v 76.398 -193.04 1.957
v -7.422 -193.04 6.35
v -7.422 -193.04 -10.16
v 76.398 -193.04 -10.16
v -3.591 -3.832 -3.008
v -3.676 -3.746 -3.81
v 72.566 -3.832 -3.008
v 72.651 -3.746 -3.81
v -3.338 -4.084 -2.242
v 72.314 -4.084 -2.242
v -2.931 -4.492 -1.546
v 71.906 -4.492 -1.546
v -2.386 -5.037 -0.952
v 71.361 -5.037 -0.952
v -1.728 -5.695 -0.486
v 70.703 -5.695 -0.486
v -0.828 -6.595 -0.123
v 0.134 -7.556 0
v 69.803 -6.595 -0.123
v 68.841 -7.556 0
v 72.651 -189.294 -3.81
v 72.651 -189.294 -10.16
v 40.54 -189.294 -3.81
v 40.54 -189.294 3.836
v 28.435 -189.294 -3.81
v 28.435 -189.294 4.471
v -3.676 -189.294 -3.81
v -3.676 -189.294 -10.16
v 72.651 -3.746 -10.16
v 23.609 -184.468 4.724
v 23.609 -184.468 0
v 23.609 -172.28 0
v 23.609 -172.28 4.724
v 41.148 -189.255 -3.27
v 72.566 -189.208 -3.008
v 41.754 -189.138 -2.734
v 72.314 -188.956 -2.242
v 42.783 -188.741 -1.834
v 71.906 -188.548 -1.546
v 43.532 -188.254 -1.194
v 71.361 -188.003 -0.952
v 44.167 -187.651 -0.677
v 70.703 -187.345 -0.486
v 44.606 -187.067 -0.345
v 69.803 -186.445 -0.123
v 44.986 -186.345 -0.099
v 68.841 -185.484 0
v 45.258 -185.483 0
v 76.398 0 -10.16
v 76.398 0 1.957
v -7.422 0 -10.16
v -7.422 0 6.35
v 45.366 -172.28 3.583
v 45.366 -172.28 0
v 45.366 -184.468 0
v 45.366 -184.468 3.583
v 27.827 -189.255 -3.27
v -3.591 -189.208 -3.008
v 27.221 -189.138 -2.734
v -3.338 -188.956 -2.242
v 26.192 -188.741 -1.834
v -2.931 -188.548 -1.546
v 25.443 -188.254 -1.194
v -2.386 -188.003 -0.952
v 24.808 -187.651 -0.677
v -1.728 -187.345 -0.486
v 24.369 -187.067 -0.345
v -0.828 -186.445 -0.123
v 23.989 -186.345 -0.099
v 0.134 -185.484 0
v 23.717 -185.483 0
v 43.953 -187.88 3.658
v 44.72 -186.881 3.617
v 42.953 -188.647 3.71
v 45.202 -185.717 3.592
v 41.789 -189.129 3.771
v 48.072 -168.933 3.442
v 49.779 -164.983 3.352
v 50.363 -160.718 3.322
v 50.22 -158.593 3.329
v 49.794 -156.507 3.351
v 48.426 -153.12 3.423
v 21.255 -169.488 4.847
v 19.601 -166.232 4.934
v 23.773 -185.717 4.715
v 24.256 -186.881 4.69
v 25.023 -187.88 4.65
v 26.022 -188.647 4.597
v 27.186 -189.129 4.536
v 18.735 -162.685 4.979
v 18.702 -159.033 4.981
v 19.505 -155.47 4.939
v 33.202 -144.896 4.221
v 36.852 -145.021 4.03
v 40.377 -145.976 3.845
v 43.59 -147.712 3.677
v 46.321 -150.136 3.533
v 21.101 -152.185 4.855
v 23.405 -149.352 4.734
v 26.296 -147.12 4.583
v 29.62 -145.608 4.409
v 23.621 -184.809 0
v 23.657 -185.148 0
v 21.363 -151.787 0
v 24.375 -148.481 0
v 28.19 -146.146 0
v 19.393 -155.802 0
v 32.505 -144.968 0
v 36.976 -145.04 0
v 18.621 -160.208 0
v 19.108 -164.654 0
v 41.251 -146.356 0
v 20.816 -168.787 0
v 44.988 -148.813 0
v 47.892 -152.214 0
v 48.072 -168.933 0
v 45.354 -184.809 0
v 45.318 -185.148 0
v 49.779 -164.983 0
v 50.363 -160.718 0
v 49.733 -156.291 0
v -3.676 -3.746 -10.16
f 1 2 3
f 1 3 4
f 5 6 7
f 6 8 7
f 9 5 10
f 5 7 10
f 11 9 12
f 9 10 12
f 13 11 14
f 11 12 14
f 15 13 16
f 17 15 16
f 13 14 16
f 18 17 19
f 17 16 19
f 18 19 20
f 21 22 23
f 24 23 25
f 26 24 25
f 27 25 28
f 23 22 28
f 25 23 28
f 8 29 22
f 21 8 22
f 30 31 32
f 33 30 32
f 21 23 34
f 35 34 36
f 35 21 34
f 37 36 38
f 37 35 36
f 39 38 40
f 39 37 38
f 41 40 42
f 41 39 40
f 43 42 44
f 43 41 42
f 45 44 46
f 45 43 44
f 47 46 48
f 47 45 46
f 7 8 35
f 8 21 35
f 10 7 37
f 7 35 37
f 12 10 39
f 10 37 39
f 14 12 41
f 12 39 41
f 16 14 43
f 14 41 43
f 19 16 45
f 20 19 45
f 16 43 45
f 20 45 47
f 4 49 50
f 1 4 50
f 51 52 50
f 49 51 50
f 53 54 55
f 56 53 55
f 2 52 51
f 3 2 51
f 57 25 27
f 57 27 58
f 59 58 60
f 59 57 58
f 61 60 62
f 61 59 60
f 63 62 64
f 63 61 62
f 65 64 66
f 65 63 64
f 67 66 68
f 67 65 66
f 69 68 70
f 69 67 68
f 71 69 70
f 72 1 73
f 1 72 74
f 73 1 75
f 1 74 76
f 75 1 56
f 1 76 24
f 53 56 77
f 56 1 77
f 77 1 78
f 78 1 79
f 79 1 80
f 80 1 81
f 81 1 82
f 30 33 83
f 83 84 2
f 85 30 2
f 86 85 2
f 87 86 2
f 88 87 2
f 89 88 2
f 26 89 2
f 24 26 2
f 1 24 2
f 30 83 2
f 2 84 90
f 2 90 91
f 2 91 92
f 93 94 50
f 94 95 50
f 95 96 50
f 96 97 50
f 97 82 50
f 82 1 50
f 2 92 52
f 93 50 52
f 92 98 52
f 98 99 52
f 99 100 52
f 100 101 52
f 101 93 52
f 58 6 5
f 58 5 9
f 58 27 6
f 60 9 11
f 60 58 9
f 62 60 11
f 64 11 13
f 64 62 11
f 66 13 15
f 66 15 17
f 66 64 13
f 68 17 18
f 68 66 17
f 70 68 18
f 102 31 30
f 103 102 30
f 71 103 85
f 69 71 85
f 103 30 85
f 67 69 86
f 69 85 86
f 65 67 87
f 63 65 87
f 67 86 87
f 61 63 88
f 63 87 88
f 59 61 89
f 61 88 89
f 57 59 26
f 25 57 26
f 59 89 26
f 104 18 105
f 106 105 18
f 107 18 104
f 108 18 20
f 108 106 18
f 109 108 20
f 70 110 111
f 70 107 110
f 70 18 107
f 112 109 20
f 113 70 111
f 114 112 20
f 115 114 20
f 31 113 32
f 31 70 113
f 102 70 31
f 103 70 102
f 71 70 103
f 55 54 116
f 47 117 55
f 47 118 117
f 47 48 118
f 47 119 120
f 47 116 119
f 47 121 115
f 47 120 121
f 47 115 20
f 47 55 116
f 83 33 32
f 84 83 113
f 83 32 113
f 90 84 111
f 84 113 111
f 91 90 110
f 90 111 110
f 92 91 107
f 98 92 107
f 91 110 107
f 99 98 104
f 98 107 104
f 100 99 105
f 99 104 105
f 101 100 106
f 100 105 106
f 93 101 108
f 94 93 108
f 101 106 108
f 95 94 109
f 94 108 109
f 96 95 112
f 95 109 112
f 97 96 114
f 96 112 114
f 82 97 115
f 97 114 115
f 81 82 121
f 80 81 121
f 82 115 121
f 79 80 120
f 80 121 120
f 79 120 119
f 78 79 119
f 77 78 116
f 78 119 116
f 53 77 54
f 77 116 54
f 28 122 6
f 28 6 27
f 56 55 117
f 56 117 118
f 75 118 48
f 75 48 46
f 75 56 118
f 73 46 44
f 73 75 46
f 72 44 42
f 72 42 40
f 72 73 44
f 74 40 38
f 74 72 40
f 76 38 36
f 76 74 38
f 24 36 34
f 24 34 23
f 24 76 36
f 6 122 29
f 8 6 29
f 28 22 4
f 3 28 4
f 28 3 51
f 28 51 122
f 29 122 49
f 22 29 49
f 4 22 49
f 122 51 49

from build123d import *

# Parameters (mm, degrees)
F0_W     = 83.82
F0_H     = 10.16
F1_DEPTH = 193.04
F2_W     = 76.327
F2_H     = 185.547
F3_DEPTH = 10.16
F5_DEPTH = 25.4
F6_R     = 3.81
F7_R     = 4.8259


# Not quite as in the source:
# - a fillet or chamfer is up to 0.001 mm smaller than in the source, because OpenCascade refuses the exact size


with BuildPart() as f1:
    # F0 (on Front) → F1 (new body)
    with BuildSketch(Plane.XZ):
        Polygon((-7.4224442948, 6.35), (-7.4224442948, 0), (76.3975557052, 0), (76.3975557052, 1.9571799405), align=None)
        with Locations((34.4875557052, -5.08)):
            Rectangle(F0_W, F0_H)
    extrude(amount=F1_DEPTH)

    # F2 (on face) → F3 (cut)
    with BuildSketch(Plane(origin=(0, 0, -10.16), x_dir=(1, 0, 0), z_dir=(0, 0, -1))):
        with Locations((34.4875557052, 96.52)):
            Rectangle(F2_W, F2_H)
    extrude(amount=-F3_DEPTH, mode=Mode.SUBTRACT)

    # F4 (on face) → F5 (cut)
    with BuildSketch(Plane(origin=(0, 0, 0), x_dir=(1, 0, 0), z_dir=(0, 0, -1))):
        with BuildLine():
            ThreePointArc((23.6090351158, 172.2802219646), (28.189972413, 146.1460578684), (50.3625557052, 160.7185))
            ThreePointArc((50.3625557052, 160.7185), (49.0599978368, 167.0160832922), (45.3660762946, 172.2802219646))
            ThreePointArc((45.3660762946, 172.2802219646), (34.4875557052, 176.5935), (23.6090351158, 172.2802219646))
        make_face()
        with BuildLine():
            ThreePointArc((23.6090351158, 172.2802219646), (34.4875557052, 176.5935), (45.3660762946, 172.2802219646))
            Line((45.3660762946, 172.2802219646), (45.3660762946, 189.2935))
            Line((45.3660762946, 189.2935), (23.6090351158, 189.2935))
            Line((23.6090351158, 189.2935), (23.6090351158, 172.2802219646))
        make_face()
    extrude(amount=-F5_DEPTH, mode=Mode.SUBTRACT)

    # F6
    f6_edges = [f1.edges().sort_by_distance(p)[0] for p in [
        (59.008566, -189.2935, 0),
        (9.966545, -189.2935, 0),
        (-3.675944, -96.52, 0),
        (72.651056, -96.52, 0),
        (34.487556, -3.7465, 0),
    ]]
    fillet(f6_edges, radius=F6_R)

    # F7 (radius 4.826 in the source; OpenCascade refuses exactly that, so slightly less here)
    f7_edges = [f1.edges().sort_by_distance(p)[0] for p in [
        (45.366076, -189.2935, 1.791735),
        (23.609035, -189.2935, 2.361855),
    ]]
    fillet(f7_edges, radius=F7_R)


solid = f1.part
